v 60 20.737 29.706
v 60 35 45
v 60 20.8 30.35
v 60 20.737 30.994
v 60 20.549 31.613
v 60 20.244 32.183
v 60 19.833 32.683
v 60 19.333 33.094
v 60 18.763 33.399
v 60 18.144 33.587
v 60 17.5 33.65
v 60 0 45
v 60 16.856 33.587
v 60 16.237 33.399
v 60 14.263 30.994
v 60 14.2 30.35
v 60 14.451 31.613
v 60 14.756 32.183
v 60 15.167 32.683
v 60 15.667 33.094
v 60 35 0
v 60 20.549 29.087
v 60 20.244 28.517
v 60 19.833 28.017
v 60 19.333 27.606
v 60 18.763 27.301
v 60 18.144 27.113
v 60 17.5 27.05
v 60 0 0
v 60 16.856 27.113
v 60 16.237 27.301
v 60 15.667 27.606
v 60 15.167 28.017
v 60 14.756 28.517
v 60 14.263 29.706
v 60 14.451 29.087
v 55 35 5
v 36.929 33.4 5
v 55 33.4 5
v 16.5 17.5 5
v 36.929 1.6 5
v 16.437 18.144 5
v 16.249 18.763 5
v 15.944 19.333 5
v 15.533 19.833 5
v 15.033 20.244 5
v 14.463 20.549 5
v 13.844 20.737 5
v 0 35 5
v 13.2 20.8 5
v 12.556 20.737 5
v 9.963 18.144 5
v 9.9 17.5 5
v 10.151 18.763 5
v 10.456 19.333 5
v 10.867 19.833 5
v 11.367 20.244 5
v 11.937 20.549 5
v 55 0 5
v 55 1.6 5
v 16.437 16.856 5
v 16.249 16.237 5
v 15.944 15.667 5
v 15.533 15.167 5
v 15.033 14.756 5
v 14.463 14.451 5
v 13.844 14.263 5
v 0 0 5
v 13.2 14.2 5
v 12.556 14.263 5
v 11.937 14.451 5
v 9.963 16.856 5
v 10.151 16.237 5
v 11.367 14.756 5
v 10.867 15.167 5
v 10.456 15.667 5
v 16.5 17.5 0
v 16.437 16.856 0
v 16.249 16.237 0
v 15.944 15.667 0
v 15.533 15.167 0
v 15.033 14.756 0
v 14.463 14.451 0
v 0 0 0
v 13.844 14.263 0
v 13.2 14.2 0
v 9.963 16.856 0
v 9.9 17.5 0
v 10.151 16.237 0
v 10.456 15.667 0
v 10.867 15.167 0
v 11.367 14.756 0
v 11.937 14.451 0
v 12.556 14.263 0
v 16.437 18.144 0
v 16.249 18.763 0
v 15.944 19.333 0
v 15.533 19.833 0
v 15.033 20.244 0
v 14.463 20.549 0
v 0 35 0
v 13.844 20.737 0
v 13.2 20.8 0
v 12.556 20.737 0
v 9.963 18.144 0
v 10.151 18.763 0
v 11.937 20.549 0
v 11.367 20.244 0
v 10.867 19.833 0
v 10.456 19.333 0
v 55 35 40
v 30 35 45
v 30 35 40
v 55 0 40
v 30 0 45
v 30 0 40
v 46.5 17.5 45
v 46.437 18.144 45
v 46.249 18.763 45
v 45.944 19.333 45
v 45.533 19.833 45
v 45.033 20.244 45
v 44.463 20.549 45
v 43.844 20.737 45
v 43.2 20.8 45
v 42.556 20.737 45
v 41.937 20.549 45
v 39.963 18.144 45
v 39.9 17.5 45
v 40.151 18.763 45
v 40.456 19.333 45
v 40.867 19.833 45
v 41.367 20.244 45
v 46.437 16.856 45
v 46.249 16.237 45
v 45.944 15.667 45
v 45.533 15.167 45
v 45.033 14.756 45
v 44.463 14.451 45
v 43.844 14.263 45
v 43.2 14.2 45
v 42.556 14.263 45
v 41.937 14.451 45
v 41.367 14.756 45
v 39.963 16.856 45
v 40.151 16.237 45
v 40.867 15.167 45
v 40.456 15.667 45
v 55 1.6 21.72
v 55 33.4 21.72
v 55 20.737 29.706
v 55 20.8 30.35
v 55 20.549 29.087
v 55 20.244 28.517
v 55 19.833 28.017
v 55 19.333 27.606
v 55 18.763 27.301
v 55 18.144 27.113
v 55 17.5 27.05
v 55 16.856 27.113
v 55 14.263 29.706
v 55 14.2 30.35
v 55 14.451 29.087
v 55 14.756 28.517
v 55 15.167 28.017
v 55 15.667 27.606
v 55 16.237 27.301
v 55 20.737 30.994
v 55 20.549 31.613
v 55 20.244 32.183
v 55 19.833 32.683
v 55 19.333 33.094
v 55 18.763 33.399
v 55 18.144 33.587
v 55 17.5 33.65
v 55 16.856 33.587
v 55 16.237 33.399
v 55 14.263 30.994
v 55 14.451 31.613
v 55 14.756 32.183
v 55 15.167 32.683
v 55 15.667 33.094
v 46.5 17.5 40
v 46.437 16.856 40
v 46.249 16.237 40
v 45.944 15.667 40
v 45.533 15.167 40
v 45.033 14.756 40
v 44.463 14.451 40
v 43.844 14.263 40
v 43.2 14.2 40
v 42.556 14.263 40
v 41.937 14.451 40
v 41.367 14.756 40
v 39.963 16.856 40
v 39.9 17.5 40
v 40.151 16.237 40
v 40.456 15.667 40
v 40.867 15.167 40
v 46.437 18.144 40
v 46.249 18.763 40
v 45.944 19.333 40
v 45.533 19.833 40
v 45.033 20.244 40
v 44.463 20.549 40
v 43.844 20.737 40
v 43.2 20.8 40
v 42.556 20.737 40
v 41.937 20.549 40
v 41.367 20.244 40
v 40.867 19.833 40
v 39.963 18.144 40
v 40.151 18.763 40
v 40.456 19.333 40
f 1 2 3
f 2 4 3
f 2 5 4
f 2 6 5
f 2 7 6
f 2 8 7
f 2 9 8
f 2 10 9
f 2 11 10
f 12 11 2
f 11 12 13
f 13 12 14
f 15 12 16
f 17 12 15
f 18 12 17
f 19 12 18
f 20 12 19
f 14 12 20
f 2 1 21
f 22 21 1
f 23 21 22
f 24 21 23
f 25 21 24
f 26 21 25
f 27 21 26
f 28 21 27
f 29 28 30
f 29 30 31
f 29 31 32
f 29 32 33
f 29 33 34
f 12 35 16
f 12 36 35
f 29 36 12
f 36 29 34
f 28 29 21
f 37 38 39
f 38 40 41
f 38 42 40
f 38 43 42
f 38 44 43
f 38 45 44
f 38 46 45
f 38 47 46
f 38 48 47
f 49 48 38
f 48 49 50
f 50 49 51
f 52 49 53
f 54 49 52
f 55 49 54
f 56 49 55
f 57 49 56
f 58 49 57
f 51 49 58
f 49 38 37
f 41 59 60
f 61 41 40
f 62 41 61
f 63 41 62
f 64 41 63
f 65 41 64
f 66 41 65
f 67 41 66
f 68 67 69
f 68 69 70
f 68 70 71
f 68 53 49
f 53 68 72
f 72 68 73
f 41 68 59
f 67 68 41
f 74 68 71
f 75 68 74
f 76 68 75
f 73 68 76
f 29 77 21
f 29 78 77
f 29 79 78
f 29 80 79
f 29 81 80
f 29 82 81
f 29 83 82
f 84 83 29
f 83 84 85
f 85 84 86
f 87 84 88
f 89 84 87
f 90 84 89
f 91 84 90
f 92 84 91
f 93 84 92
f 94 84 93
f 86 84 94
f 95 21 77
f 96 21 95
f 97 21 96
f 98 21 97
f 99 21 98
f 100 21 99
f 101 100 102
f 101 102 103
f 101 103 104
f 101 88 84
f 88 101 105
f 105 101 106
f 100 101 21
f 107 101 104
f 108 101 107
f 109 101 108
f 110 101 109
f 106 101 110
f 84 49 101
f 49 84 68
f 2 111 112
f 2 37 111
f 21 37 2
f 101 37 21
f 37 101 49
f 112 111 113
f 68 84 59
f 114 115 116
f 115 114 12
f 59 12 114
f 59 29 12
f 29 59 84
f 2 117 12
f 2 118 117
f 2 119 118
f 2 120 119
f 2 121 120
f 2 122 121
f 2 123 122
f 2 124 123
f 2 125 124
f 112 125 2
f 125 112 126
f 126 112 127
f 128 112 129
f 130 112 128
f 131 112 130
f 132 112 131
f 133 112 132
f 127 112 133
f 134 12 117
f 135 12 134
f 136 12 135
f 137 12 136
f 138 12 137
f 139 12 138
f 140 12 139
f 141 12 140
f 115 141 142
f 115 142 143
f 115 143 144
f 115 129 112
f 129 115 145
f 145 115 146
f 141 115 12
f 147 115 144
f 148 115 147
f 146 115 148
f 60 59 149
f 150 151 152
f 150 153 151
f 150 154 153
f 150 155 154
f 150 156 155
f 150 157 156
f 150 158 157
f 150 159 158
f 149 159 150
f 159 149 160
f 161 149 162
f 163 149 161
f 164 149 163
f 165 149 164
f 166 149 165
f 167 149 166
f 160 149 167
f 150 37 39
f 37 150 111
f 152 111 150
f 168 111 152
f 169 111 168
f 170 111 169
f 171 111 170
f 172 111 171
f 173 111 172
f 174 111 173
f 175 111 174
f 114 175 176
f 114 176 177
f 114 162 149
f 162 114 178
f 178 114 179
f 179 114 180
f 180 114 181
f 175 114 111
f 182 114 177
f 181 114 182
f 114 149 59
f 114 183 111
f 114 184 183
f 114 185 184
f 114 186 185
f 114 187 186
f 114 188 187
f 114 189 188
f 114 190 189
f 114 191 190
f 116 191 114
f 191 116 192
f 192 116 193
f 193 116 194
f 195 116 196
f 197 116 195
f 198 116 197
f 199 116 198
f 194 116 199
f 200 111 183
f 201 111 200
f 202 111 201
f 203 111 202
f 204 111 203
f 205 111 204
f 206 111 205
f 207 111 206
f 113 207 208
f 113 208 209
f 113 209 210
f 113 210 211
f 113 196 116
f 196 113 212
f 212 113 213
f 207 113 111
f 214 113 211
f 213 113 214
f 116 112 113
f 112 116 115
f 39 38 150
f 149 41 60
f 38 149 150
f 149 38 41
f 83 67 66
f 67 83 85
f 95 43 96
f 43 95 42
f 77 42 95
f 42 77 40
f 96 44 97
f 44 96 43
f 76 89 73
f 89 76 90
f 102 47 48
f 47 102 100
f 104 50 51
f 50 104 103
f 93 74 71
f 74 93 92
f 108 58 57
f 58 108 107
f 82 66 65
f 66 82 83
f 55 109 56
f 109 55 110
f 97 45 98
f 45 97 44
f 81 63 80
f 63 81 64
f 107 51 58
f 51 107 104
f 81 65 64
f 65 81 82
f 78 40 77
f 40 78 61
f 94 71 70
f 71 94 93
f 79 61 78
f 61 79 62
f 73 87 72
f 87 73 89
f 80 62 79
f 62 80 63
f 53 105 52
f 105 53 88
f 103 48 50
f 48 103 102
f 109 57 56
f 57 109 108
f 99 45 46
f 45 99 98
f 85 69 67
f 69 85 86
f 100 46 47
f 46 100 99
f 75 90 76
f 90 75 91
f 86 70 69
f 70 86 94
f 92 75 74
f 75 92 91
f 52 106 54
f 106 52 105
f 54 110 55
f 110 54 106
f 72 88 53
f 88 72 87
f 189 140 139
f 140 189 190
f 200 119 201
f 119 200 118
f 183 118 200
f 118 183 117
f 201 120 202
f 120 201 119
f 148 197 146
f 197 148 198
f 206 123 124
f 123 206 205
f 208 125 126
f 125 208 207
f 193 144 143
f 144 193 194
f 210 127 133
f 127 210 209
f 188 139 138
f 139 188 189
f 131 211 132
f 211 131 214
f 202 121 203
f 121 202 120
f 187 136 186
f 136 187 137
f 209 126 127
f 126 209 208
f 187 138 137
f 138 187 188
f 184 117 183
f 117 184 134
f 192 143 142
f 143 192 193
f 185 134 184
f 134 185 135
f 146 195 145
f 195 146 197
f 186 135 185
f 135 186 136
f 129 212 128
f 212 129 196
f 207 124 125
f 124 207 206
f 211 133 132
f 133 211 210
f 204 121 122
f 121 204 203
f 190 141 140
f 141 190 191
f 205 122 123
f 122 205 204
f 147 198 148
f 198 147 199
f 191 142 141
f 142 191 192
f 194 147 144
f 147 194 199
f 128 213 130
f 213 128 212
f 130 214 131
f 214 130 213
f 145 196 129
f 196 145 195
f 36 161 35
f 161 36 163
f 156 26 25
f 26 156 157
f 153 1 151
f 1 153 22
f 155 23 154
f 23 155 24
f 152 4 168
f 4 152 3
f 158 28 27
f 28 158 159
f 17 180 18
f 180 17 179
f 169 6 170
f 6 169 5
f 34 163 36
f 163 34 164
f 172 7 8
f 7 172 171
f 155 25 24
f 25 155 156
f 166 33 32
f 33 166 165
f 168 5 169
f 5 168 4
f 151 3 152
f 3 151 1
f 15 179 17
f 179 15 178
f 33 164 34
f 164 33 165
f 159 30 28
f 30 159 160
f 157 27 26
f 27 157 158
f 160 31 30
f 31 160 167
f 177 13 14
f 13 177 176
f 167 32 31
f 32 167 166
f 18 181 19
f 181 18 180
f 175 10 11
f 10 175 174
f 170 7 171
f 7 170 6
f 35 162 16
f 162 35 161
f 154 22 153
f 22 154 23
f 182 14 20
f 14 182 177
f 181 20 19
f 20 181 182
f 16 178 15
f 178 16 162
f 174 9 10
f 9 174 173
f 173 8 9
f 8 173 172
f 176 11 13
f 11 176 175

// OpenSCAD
$fn = 32;

// ----------------------------------------------------------------------
// Z-bracket: 60 x 35 x 45 mm
// ----------------------------------------------------------------------

// --- parameters (mm) ---
foot_len = 60;            // lower foot length, X
top_len = 25;             // upper foot length, X
depth = 35;               // bracket width, Y
step_h = 45;              // overall rise, Z
plate_t = 5;              // plate thickness
hole_d = 6.6;             // clearance for M6
rib_len = 19.8;           // gusset leg
rib_sink = 1.6;           // gusset overlap into the plates

module hole_z(px, py, z0) {
  translate([px, py, z0 - 2.5]) cylinder(h = plate_t + 5, d = hole_d);
}
module hole_x(py, pz) {
  translate([-2.5, py, pz]) rotate([0, 90, 0]) cylinder(h = plate_t + 5, d = hole_d);
}
module gusset(x0) {
  translate([x0, depth - rib_sink, 0])
    rotate([90, 0, 0])
      linear_extrude(height = depth - 2 * rib_sink)
        polygon(points = [[rib_sink, plate_t - rib_sink],
                          [rib_sink, plate_t - rib_sink + rib_len],
                          [-rib_len, plate_t - rib_sink]]);
}

difference() {
  union() {
    cube([foot_len, depth, plate_t]);
    /* web, overlapping the lower foot */
    translate([foot_len - plate_t, 0, 0]) cube([plate_t, depth, step_h]);
    /* upper foot, sunk into the web */
    translate([foot_len - plate_t - top_len, 0, step_h - plate_t]) cube([top_len + plate_t, depth, plate_t]);
    gusset(foot_len - plate_t);
  }
  hole_z(13.2, 17.5, 0);
  translate([foot_len - plate_t - 11.8, 0, 0]) hole_z(0, 17.5, step_h - plate_t);
  translate([foot_len - plate_t, 0, 0]) hole_x(17.5, 30.35);
}
